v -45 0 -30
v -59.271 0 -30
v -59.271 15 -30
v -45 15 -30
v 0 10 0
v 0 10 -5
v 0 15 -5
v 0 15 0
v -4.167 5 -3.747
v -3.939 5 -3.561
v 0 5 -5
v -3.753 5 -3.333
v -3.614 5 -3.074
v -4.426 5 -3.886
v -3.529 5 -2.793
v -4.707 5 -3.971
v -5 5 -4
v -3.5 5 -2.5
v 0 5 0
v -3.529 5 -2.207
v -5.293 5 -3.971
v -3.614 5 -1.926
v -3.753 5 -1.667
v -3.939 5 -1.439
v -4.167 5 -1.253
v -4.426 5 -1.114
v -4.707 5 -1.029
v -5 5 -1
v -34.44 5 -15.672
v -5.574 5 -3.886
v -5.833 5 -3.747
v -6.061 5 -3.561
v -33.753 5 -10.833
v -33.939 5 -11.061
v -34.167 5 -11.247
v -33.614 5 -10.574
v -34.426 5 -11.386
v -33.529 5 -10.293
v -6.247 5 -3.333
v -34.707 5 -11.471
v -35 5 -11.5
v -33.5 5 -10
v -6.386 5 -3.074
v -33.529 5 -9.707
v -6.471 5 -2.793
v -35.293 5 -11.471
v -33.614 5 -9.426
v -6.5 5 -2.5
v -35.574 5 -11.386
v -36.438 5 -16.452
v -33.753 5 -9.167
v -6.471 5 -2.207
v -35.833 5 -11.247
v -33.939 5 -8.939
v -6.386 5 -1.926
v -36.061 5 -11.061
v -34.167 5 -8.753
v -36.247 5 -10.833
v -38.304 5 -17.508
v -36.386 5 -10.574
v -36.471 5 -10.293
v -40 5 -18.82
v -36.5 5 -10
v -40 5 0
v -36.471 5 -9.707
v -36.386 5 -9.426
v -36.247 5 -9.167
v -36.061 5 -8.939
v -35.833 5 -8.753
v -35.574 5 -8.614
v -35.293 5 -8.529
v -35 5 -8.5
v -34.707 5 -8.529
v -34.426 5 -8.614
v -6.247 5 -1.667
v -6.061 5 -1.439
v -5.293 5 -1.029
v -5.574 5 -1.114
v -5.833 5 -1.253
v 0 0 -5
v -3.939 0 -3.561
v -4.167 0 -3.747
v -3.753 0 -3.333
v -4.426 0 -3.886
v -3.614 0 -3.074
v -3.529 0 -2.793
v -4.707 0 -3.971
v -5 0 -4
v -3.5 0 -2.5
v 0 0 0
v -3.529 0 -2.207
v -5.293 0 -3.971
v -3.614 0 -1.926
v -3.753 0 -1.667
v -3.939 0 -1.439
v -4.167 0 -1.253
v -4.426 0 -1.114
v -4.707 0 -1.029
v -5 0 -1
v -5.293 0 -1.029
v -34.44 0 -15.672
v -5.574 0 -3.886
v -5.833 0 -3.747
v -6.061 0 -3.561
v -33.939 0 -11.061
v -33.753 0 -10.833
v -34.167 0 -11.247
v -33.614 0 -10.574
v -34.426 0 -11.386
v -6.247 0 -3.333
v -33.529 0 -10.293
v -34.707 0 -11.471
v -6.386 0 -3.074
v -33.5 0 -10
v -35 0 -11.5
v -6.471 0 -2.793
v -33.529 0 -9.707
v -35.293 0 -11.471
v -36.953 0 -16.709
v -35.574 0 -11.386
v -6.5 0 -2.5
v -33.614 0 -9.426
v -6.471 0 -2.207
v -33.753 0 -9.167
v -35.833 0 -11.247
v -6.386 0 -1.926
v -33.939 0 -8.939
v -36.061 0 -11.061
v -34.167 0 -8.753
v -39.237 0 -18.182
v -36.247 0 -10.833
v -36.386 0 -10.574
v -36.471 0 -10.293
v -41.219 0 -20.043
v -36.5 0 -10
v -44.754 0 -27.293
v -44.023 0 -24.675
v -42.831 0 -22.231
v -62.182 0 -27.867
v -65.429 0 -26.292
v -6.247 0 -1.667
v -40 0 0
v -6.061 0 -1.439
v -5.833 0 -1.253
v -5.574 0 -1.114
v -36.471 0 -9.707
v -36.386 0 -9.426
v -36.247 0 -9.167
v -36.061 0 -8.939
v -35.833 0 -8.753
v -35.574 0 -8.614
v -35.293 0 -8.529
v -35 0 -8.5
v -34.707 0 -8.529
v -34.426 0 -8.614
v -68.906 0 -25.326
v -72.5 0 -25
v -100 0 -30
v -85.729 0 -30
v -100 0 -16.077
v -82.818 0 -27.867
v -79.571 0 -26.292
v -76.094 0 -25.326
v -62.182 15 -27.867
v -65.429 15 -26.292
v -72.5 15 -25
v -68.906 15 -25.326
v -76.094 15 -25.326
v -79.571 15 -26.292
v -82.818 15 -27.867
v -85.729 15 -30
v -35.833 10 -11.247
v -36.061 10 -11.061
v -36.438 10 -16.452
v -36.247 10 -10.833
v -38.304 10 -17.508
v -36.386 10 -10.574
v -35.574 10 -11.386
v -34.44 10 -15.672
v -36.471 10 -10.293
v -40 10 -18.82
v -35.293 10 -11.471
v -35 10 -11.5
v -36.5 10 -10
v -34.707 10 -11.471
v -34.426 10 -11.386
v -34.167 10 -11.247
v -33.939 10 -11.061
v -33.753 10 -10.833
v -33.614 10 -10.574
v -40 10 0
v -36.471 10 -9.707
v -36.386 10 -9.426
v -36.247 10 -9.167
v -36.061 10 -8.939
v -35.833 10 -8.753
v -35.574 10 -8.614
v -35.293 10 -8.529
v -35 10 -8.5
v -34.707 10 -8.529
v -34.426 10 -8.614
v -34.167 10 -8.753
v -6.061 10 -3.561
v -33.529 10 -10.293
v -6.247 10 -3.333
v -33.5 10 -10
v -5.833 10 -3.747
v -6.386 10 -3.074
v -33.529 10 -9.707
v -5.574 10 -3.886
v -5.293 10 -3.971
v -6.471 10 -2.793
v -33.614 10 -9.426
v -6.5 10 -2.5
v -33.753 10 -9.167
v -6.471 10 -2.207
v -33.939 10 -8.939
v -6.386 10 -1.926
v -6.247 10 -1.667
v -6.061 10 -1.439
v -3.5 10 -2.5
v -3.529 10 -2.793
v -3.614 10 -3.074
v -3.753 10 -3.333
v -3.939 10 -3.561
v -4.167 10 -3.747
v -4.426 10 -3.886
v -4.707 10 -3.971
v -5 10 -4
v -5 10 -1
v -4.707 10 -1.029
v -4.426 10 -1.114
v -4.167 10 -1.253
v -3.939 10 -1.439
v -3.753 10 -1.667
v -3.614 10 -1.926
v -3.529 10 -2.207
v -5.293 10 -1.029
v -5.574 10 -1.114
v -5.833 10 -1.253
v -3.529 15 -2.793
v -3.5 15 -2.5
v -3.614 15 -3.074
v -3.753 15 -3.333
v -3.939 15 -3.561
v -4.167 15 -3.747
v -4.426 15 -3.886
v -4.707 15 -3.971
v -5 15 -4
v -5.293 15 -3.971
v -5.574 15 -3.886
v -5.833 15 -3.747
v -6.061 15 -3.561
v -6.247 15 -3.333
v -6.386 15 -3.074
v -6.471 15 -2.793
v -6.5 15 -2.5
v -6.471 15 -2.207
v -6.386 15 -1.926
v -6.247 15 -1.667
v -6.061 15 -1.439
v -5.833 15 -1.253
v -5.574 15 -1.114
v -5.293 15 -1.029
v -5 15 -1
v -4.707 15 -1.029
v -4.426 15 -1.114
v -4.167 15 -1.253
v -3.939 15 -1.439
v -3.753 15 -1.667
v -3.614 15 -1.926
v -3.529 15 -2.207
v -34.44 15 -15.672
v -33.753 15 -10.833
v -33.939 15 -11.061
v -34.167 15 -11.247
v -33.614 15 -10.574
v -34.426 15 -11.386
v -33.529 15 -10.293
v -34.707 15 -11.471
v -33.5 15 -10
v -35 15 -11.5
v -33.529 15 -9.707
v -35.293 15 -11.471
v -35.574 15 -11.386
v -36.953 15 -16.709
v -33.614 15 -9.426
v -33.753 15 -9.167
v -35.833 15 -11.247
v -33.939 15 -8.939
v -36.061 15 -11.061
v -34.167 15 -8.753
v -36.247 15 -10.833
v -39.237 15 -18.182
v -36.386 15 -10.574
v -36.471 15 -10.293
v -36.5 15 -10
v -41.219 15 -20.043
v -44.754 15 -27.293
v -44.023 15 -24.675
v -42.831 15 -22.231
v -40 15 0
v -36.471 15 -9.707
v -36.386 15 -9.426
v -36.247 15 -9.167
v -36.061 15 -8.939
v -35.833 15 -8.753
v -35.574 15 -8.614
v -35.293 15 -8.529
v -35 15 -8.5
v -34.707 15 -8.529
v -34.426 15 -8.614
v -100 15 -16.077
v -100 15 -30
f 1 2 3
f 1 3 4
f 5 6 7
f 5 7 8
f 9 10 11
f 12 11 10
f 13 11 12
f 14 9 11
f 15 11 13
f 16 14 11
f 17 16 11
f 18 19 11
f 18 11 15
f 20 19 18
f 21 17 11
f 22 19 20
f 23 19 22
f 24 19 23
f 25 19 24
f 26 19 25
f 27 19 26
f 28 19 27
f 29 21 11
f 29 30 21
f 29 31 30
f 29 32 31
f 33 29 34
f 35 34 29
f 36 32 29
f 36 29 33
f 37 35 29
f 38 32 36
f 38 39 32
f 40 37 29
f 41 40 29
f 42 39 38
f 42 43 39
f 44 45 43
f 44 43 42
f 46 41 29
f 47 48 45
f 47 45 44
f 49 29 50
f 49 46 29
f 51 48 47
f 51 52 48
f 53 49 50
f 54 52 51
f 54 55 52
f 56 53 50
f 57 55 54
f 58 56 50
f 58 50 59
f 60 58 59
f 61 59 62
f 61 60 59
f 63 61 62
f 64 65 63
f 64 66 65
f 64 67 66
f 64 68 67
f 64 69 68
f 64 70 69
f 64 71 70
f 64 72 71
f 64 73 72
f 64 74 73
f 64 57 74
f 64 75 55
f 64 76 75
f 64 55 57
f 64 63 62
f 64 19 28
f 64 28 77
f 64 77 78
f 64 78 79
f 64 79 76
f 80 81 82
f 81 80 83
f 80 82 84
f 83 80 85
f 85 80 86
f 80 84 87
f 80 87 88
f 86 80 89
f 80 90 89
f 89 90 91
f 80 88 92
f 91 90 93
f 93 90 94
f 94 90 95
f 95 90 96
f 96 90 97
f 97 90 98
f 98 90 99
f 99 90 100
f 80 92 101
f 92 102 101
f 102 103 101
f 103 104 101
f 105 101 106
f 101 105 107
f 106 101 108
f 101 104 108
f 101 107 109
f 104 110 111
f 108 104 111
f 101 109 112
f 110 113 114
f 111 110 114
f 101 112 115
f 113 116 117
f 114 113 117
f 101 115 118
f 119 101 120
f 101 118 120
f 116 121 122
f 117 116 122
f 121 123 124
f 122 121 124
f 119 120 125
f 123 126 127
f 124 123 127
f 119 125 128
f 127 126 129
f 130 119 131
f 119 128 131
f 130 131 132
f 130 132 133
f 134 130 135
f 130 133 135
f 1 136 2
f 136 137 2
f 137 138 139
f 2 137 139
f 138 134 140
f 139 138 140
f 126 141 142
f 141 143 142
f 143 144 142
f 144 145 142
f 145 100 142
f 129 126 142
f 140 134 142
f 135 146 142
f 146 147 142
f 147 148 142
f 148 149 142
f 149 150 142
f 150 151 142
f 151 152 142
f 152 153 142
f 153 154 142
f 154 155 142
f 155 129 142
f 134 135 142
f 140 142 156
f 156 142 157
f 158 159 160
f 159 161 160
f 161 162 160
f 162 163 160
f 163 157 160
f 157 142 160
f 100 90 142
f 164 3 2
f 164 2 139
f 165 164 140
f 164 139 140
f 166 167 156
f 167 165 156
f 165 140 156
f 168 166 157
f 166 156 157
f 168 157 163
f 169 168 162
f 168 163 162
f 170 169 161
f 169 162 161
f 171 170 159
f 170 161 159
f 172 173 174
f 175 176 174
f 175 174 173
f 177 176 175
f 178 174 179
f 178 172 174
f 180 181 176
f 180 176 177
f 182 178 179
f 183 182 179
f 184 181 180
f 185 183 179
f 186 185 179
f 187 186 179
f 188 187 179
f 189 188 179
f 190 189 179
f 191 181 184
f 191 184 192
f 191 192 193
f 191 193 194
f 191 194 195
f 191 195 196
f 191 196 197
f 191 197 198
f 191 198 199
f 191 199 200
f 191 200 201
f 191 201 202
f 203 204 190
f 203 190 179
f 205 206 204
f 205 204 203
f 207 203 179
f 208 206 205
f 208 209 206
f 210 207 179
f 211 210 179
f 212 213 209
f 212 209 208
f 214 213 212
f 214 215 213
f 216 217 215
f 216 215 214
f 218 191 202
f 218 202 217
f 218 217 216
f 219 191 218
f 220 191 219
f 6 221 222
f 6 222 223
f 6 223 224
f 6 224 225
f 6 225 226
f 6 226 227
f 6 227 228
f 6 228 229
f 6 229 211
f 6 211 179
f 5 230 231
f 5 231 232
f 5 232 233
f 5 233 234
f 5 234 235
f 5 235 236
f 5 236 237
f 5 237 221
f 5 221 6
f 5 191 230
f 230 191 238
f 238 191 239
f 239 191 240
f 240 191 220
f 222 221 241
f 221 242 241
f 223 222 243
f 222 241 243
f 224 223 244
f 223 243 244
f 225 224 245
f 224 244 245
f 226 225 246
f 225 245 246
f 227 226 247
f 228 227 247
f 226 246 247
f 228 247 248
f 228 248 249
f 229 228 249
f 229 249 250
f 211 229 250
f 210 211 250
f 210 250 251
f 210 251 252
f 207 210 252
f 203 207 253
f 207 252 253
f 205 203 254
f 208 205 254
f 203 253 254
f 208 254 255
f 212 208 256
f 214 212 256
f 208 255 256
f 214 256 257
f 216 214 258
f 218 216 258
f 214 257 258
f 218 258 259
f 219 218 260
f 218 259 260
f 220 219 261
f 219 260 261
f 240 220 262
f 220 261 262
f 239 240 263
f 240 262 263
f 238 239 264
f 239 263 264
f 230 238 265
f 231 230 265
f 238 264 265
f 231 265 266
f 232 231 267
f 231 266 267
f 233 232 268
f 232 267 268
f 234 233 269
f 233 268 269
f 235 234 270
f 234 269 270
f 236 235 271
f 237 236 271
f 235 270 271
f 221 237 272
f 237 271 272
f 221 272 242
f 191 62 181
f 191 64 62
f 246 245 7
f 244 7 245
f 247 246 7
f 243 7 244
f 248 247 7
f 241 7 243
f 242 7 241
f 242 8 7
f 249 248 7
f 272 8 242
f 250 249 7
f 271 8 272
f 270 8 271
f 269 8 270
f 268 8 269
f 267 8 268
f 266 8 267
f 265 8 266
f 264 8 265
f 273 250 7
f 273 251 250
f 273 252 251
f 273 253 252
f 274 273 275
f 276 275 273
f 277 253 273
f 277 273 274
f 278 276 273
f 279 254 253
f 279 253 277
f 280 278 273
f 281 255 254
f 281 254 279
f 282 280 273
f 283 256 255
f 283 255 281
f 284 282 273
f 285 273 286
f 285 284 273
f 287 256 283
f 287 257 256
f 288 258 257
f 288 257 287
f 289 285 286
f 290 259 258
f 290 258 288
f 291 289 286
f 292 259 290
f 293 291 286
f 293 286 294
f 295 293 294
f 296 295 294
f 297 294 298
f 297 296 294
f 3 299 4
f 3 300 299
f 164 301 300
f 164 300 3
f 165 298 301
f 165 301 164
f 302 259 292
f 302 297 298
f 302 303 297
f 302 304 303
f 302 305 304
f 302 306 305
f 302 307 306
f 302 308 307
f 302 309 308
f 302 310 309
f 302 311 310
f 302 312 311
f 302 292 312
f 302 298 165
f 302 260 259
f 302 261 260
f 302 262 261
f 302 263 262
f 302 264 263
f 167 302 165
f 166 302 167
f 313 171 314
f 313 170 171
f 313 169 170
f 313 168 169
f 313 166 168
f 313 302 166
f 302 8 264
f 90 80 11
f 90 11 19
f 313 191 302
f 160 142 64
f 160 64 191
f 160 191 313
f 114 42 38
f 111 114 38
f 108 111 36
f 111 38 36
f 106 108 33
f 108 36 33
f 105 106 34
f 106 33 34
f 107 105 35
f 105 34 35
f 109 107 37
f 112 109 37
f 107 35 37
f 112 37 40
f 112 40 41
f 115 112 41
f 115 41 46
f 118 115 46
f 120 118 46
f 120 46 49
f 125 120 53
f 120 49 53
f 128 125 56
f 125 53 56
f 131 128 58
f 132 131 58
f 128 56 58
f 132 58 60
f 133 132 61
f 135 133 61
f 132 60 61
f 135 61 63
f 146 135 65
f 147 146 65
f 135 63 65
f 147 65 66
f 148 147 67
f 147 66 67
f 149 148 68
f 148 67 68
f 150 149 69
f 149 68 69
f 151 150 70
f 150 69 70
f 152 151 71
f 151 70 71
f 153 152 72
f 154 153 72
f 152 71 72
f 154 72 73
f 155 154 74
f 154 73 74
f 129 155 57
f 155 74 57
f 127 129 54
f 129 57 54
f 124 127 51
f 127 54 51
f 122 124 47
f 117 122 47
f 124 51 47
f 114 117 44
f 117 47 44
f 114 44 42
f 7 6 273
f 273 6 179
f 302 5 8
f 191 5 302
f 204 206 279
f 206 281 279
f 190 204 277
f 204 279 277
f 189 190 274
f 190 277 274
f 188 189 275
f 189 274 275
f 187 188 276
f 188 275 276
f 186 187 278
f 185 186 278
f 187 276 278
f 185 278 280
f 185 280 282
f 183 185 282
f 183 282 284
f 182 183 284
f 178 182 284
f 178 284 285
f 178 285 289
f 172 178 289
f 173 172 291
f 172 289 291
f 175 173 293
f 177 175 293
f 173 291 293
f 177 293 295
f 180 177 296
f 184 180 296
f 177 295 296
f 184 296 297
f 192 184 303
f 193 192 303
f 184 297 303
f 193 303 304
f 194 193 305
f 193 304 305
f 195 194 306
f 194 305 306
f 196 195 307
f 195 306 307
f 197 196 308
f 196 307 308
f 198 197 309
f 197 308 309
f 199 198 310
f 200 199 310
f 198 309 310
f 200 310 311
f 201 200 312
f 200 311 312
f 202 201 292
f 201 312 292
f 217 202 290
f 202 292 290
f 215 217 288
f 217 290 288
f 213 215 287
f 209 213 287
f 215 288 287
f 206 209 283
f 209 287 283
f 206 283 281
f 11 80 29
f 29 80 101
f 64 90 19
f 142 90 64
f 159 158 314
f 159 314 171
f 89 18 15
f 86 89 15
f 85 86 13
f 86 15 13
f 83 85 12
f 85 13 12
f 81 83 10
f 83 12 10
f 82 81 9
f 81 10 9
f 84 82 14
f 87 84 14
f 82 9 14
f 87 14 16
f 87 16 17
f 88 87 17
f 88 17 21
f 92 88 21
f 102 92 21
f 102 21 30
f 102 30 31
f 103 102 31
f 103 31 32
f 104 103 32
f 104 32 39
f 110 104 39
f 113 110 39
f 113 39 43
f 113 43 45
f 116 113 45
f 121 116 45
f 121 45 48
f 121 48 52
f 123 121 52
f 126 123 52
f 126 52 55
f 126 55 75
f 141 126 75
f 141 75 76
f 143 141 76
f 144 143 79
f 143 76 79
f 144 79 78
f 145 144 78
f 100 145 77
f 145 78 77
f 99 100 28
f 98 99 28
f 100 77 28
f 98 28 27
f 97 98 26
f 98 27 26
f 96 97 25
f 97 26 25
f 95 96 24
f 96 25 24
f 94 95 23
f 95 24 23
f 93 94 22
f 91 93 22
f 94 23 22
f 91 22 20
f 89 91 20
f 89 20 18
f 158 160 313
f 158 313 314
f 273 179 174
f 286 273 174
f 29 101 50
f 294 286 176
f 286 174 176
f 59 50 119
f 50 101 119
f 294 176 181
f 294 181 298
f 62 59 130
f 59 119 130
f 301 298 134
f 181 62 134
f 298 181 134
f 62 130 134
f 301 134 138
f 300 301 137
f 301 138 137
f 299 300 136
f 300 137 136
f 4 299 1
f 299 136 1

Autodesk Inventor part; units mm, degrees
ref_plane "YZ Plane" through (0, 0, 0) normal (1, 0, 0) x (0, 1, 0)
ref_plane "XZ Plane" through (0, 0, 0) normal (0, 1, 0) x (-1, 0, 0)
ref_plane "XY Plane" through (0, 0, 0) normal (0, 0, 1) x (1, 0, 0)
sketch "Sketch1" plane through (0, 0, 0) normal (0, 1, 0) x (-1, 0, 0)
  line L0 (100, -16.077) -> (100, -30)
  line L1 (0, -5) -> (0, 0)
  line L2 (0, 0) -> (40, 0)
  line L3 (40, 0) -> (100, -16.077)
  line L4 (100, -16.077) -> (100, -26.077)
  line L5 (45, -30) -> (55, -30)
  arc A0 (45, -30) -> (34.4399, -15.6721) centre (30, -30) ccw
  line L6 (0, -5) -> (34.4399, -15.6721)
  arc A1 (85.7288, -30) -> (59.2712, -30) centre (72.5, -45) ccw
  line L7 (100, -30) -> (85.7288, -30)
  line L8 (59.2712, -30) -> (45, -30)
extrude "Extrusion1" add sketch "Sketch1" along normal blind 15
sketch "Sketch2" plane through (0, 15, 0) normal (0, 1, 0) x (1, 0, 0)
  line L0 (0, 0) -> (0, 5) projected
  circle A0 centre (-5, 2.5) radius 1.5
  circle A1 centre (-35, 10) radius 1.5
  dimension "d14" = 3
  dimension "d17" = 3
extrude "Extrusion2" cut sketch "Sketch2" against normal blind 15
sketch "Sketch3" plane through (-40, 0, 0) normal (0, 0, 1) x (1, 0, 0)
  line L0 (40, 0) -> (40, 15) projected
  line L1 (40, 5) -> (0, 5)
  line L2 (0, 5) -> (0, 10)
  line L3 (0, 10) -> (40, 10)
  line L4 (40, 10) -> (40, 5)
  dimension "d20" = 5
  dimension "d21" = 40
  dimension "d22" = 5
extrude "Extrusion3" cut sketch "Sketch3" against normal blind 44.75
properties part number "gripper3"
